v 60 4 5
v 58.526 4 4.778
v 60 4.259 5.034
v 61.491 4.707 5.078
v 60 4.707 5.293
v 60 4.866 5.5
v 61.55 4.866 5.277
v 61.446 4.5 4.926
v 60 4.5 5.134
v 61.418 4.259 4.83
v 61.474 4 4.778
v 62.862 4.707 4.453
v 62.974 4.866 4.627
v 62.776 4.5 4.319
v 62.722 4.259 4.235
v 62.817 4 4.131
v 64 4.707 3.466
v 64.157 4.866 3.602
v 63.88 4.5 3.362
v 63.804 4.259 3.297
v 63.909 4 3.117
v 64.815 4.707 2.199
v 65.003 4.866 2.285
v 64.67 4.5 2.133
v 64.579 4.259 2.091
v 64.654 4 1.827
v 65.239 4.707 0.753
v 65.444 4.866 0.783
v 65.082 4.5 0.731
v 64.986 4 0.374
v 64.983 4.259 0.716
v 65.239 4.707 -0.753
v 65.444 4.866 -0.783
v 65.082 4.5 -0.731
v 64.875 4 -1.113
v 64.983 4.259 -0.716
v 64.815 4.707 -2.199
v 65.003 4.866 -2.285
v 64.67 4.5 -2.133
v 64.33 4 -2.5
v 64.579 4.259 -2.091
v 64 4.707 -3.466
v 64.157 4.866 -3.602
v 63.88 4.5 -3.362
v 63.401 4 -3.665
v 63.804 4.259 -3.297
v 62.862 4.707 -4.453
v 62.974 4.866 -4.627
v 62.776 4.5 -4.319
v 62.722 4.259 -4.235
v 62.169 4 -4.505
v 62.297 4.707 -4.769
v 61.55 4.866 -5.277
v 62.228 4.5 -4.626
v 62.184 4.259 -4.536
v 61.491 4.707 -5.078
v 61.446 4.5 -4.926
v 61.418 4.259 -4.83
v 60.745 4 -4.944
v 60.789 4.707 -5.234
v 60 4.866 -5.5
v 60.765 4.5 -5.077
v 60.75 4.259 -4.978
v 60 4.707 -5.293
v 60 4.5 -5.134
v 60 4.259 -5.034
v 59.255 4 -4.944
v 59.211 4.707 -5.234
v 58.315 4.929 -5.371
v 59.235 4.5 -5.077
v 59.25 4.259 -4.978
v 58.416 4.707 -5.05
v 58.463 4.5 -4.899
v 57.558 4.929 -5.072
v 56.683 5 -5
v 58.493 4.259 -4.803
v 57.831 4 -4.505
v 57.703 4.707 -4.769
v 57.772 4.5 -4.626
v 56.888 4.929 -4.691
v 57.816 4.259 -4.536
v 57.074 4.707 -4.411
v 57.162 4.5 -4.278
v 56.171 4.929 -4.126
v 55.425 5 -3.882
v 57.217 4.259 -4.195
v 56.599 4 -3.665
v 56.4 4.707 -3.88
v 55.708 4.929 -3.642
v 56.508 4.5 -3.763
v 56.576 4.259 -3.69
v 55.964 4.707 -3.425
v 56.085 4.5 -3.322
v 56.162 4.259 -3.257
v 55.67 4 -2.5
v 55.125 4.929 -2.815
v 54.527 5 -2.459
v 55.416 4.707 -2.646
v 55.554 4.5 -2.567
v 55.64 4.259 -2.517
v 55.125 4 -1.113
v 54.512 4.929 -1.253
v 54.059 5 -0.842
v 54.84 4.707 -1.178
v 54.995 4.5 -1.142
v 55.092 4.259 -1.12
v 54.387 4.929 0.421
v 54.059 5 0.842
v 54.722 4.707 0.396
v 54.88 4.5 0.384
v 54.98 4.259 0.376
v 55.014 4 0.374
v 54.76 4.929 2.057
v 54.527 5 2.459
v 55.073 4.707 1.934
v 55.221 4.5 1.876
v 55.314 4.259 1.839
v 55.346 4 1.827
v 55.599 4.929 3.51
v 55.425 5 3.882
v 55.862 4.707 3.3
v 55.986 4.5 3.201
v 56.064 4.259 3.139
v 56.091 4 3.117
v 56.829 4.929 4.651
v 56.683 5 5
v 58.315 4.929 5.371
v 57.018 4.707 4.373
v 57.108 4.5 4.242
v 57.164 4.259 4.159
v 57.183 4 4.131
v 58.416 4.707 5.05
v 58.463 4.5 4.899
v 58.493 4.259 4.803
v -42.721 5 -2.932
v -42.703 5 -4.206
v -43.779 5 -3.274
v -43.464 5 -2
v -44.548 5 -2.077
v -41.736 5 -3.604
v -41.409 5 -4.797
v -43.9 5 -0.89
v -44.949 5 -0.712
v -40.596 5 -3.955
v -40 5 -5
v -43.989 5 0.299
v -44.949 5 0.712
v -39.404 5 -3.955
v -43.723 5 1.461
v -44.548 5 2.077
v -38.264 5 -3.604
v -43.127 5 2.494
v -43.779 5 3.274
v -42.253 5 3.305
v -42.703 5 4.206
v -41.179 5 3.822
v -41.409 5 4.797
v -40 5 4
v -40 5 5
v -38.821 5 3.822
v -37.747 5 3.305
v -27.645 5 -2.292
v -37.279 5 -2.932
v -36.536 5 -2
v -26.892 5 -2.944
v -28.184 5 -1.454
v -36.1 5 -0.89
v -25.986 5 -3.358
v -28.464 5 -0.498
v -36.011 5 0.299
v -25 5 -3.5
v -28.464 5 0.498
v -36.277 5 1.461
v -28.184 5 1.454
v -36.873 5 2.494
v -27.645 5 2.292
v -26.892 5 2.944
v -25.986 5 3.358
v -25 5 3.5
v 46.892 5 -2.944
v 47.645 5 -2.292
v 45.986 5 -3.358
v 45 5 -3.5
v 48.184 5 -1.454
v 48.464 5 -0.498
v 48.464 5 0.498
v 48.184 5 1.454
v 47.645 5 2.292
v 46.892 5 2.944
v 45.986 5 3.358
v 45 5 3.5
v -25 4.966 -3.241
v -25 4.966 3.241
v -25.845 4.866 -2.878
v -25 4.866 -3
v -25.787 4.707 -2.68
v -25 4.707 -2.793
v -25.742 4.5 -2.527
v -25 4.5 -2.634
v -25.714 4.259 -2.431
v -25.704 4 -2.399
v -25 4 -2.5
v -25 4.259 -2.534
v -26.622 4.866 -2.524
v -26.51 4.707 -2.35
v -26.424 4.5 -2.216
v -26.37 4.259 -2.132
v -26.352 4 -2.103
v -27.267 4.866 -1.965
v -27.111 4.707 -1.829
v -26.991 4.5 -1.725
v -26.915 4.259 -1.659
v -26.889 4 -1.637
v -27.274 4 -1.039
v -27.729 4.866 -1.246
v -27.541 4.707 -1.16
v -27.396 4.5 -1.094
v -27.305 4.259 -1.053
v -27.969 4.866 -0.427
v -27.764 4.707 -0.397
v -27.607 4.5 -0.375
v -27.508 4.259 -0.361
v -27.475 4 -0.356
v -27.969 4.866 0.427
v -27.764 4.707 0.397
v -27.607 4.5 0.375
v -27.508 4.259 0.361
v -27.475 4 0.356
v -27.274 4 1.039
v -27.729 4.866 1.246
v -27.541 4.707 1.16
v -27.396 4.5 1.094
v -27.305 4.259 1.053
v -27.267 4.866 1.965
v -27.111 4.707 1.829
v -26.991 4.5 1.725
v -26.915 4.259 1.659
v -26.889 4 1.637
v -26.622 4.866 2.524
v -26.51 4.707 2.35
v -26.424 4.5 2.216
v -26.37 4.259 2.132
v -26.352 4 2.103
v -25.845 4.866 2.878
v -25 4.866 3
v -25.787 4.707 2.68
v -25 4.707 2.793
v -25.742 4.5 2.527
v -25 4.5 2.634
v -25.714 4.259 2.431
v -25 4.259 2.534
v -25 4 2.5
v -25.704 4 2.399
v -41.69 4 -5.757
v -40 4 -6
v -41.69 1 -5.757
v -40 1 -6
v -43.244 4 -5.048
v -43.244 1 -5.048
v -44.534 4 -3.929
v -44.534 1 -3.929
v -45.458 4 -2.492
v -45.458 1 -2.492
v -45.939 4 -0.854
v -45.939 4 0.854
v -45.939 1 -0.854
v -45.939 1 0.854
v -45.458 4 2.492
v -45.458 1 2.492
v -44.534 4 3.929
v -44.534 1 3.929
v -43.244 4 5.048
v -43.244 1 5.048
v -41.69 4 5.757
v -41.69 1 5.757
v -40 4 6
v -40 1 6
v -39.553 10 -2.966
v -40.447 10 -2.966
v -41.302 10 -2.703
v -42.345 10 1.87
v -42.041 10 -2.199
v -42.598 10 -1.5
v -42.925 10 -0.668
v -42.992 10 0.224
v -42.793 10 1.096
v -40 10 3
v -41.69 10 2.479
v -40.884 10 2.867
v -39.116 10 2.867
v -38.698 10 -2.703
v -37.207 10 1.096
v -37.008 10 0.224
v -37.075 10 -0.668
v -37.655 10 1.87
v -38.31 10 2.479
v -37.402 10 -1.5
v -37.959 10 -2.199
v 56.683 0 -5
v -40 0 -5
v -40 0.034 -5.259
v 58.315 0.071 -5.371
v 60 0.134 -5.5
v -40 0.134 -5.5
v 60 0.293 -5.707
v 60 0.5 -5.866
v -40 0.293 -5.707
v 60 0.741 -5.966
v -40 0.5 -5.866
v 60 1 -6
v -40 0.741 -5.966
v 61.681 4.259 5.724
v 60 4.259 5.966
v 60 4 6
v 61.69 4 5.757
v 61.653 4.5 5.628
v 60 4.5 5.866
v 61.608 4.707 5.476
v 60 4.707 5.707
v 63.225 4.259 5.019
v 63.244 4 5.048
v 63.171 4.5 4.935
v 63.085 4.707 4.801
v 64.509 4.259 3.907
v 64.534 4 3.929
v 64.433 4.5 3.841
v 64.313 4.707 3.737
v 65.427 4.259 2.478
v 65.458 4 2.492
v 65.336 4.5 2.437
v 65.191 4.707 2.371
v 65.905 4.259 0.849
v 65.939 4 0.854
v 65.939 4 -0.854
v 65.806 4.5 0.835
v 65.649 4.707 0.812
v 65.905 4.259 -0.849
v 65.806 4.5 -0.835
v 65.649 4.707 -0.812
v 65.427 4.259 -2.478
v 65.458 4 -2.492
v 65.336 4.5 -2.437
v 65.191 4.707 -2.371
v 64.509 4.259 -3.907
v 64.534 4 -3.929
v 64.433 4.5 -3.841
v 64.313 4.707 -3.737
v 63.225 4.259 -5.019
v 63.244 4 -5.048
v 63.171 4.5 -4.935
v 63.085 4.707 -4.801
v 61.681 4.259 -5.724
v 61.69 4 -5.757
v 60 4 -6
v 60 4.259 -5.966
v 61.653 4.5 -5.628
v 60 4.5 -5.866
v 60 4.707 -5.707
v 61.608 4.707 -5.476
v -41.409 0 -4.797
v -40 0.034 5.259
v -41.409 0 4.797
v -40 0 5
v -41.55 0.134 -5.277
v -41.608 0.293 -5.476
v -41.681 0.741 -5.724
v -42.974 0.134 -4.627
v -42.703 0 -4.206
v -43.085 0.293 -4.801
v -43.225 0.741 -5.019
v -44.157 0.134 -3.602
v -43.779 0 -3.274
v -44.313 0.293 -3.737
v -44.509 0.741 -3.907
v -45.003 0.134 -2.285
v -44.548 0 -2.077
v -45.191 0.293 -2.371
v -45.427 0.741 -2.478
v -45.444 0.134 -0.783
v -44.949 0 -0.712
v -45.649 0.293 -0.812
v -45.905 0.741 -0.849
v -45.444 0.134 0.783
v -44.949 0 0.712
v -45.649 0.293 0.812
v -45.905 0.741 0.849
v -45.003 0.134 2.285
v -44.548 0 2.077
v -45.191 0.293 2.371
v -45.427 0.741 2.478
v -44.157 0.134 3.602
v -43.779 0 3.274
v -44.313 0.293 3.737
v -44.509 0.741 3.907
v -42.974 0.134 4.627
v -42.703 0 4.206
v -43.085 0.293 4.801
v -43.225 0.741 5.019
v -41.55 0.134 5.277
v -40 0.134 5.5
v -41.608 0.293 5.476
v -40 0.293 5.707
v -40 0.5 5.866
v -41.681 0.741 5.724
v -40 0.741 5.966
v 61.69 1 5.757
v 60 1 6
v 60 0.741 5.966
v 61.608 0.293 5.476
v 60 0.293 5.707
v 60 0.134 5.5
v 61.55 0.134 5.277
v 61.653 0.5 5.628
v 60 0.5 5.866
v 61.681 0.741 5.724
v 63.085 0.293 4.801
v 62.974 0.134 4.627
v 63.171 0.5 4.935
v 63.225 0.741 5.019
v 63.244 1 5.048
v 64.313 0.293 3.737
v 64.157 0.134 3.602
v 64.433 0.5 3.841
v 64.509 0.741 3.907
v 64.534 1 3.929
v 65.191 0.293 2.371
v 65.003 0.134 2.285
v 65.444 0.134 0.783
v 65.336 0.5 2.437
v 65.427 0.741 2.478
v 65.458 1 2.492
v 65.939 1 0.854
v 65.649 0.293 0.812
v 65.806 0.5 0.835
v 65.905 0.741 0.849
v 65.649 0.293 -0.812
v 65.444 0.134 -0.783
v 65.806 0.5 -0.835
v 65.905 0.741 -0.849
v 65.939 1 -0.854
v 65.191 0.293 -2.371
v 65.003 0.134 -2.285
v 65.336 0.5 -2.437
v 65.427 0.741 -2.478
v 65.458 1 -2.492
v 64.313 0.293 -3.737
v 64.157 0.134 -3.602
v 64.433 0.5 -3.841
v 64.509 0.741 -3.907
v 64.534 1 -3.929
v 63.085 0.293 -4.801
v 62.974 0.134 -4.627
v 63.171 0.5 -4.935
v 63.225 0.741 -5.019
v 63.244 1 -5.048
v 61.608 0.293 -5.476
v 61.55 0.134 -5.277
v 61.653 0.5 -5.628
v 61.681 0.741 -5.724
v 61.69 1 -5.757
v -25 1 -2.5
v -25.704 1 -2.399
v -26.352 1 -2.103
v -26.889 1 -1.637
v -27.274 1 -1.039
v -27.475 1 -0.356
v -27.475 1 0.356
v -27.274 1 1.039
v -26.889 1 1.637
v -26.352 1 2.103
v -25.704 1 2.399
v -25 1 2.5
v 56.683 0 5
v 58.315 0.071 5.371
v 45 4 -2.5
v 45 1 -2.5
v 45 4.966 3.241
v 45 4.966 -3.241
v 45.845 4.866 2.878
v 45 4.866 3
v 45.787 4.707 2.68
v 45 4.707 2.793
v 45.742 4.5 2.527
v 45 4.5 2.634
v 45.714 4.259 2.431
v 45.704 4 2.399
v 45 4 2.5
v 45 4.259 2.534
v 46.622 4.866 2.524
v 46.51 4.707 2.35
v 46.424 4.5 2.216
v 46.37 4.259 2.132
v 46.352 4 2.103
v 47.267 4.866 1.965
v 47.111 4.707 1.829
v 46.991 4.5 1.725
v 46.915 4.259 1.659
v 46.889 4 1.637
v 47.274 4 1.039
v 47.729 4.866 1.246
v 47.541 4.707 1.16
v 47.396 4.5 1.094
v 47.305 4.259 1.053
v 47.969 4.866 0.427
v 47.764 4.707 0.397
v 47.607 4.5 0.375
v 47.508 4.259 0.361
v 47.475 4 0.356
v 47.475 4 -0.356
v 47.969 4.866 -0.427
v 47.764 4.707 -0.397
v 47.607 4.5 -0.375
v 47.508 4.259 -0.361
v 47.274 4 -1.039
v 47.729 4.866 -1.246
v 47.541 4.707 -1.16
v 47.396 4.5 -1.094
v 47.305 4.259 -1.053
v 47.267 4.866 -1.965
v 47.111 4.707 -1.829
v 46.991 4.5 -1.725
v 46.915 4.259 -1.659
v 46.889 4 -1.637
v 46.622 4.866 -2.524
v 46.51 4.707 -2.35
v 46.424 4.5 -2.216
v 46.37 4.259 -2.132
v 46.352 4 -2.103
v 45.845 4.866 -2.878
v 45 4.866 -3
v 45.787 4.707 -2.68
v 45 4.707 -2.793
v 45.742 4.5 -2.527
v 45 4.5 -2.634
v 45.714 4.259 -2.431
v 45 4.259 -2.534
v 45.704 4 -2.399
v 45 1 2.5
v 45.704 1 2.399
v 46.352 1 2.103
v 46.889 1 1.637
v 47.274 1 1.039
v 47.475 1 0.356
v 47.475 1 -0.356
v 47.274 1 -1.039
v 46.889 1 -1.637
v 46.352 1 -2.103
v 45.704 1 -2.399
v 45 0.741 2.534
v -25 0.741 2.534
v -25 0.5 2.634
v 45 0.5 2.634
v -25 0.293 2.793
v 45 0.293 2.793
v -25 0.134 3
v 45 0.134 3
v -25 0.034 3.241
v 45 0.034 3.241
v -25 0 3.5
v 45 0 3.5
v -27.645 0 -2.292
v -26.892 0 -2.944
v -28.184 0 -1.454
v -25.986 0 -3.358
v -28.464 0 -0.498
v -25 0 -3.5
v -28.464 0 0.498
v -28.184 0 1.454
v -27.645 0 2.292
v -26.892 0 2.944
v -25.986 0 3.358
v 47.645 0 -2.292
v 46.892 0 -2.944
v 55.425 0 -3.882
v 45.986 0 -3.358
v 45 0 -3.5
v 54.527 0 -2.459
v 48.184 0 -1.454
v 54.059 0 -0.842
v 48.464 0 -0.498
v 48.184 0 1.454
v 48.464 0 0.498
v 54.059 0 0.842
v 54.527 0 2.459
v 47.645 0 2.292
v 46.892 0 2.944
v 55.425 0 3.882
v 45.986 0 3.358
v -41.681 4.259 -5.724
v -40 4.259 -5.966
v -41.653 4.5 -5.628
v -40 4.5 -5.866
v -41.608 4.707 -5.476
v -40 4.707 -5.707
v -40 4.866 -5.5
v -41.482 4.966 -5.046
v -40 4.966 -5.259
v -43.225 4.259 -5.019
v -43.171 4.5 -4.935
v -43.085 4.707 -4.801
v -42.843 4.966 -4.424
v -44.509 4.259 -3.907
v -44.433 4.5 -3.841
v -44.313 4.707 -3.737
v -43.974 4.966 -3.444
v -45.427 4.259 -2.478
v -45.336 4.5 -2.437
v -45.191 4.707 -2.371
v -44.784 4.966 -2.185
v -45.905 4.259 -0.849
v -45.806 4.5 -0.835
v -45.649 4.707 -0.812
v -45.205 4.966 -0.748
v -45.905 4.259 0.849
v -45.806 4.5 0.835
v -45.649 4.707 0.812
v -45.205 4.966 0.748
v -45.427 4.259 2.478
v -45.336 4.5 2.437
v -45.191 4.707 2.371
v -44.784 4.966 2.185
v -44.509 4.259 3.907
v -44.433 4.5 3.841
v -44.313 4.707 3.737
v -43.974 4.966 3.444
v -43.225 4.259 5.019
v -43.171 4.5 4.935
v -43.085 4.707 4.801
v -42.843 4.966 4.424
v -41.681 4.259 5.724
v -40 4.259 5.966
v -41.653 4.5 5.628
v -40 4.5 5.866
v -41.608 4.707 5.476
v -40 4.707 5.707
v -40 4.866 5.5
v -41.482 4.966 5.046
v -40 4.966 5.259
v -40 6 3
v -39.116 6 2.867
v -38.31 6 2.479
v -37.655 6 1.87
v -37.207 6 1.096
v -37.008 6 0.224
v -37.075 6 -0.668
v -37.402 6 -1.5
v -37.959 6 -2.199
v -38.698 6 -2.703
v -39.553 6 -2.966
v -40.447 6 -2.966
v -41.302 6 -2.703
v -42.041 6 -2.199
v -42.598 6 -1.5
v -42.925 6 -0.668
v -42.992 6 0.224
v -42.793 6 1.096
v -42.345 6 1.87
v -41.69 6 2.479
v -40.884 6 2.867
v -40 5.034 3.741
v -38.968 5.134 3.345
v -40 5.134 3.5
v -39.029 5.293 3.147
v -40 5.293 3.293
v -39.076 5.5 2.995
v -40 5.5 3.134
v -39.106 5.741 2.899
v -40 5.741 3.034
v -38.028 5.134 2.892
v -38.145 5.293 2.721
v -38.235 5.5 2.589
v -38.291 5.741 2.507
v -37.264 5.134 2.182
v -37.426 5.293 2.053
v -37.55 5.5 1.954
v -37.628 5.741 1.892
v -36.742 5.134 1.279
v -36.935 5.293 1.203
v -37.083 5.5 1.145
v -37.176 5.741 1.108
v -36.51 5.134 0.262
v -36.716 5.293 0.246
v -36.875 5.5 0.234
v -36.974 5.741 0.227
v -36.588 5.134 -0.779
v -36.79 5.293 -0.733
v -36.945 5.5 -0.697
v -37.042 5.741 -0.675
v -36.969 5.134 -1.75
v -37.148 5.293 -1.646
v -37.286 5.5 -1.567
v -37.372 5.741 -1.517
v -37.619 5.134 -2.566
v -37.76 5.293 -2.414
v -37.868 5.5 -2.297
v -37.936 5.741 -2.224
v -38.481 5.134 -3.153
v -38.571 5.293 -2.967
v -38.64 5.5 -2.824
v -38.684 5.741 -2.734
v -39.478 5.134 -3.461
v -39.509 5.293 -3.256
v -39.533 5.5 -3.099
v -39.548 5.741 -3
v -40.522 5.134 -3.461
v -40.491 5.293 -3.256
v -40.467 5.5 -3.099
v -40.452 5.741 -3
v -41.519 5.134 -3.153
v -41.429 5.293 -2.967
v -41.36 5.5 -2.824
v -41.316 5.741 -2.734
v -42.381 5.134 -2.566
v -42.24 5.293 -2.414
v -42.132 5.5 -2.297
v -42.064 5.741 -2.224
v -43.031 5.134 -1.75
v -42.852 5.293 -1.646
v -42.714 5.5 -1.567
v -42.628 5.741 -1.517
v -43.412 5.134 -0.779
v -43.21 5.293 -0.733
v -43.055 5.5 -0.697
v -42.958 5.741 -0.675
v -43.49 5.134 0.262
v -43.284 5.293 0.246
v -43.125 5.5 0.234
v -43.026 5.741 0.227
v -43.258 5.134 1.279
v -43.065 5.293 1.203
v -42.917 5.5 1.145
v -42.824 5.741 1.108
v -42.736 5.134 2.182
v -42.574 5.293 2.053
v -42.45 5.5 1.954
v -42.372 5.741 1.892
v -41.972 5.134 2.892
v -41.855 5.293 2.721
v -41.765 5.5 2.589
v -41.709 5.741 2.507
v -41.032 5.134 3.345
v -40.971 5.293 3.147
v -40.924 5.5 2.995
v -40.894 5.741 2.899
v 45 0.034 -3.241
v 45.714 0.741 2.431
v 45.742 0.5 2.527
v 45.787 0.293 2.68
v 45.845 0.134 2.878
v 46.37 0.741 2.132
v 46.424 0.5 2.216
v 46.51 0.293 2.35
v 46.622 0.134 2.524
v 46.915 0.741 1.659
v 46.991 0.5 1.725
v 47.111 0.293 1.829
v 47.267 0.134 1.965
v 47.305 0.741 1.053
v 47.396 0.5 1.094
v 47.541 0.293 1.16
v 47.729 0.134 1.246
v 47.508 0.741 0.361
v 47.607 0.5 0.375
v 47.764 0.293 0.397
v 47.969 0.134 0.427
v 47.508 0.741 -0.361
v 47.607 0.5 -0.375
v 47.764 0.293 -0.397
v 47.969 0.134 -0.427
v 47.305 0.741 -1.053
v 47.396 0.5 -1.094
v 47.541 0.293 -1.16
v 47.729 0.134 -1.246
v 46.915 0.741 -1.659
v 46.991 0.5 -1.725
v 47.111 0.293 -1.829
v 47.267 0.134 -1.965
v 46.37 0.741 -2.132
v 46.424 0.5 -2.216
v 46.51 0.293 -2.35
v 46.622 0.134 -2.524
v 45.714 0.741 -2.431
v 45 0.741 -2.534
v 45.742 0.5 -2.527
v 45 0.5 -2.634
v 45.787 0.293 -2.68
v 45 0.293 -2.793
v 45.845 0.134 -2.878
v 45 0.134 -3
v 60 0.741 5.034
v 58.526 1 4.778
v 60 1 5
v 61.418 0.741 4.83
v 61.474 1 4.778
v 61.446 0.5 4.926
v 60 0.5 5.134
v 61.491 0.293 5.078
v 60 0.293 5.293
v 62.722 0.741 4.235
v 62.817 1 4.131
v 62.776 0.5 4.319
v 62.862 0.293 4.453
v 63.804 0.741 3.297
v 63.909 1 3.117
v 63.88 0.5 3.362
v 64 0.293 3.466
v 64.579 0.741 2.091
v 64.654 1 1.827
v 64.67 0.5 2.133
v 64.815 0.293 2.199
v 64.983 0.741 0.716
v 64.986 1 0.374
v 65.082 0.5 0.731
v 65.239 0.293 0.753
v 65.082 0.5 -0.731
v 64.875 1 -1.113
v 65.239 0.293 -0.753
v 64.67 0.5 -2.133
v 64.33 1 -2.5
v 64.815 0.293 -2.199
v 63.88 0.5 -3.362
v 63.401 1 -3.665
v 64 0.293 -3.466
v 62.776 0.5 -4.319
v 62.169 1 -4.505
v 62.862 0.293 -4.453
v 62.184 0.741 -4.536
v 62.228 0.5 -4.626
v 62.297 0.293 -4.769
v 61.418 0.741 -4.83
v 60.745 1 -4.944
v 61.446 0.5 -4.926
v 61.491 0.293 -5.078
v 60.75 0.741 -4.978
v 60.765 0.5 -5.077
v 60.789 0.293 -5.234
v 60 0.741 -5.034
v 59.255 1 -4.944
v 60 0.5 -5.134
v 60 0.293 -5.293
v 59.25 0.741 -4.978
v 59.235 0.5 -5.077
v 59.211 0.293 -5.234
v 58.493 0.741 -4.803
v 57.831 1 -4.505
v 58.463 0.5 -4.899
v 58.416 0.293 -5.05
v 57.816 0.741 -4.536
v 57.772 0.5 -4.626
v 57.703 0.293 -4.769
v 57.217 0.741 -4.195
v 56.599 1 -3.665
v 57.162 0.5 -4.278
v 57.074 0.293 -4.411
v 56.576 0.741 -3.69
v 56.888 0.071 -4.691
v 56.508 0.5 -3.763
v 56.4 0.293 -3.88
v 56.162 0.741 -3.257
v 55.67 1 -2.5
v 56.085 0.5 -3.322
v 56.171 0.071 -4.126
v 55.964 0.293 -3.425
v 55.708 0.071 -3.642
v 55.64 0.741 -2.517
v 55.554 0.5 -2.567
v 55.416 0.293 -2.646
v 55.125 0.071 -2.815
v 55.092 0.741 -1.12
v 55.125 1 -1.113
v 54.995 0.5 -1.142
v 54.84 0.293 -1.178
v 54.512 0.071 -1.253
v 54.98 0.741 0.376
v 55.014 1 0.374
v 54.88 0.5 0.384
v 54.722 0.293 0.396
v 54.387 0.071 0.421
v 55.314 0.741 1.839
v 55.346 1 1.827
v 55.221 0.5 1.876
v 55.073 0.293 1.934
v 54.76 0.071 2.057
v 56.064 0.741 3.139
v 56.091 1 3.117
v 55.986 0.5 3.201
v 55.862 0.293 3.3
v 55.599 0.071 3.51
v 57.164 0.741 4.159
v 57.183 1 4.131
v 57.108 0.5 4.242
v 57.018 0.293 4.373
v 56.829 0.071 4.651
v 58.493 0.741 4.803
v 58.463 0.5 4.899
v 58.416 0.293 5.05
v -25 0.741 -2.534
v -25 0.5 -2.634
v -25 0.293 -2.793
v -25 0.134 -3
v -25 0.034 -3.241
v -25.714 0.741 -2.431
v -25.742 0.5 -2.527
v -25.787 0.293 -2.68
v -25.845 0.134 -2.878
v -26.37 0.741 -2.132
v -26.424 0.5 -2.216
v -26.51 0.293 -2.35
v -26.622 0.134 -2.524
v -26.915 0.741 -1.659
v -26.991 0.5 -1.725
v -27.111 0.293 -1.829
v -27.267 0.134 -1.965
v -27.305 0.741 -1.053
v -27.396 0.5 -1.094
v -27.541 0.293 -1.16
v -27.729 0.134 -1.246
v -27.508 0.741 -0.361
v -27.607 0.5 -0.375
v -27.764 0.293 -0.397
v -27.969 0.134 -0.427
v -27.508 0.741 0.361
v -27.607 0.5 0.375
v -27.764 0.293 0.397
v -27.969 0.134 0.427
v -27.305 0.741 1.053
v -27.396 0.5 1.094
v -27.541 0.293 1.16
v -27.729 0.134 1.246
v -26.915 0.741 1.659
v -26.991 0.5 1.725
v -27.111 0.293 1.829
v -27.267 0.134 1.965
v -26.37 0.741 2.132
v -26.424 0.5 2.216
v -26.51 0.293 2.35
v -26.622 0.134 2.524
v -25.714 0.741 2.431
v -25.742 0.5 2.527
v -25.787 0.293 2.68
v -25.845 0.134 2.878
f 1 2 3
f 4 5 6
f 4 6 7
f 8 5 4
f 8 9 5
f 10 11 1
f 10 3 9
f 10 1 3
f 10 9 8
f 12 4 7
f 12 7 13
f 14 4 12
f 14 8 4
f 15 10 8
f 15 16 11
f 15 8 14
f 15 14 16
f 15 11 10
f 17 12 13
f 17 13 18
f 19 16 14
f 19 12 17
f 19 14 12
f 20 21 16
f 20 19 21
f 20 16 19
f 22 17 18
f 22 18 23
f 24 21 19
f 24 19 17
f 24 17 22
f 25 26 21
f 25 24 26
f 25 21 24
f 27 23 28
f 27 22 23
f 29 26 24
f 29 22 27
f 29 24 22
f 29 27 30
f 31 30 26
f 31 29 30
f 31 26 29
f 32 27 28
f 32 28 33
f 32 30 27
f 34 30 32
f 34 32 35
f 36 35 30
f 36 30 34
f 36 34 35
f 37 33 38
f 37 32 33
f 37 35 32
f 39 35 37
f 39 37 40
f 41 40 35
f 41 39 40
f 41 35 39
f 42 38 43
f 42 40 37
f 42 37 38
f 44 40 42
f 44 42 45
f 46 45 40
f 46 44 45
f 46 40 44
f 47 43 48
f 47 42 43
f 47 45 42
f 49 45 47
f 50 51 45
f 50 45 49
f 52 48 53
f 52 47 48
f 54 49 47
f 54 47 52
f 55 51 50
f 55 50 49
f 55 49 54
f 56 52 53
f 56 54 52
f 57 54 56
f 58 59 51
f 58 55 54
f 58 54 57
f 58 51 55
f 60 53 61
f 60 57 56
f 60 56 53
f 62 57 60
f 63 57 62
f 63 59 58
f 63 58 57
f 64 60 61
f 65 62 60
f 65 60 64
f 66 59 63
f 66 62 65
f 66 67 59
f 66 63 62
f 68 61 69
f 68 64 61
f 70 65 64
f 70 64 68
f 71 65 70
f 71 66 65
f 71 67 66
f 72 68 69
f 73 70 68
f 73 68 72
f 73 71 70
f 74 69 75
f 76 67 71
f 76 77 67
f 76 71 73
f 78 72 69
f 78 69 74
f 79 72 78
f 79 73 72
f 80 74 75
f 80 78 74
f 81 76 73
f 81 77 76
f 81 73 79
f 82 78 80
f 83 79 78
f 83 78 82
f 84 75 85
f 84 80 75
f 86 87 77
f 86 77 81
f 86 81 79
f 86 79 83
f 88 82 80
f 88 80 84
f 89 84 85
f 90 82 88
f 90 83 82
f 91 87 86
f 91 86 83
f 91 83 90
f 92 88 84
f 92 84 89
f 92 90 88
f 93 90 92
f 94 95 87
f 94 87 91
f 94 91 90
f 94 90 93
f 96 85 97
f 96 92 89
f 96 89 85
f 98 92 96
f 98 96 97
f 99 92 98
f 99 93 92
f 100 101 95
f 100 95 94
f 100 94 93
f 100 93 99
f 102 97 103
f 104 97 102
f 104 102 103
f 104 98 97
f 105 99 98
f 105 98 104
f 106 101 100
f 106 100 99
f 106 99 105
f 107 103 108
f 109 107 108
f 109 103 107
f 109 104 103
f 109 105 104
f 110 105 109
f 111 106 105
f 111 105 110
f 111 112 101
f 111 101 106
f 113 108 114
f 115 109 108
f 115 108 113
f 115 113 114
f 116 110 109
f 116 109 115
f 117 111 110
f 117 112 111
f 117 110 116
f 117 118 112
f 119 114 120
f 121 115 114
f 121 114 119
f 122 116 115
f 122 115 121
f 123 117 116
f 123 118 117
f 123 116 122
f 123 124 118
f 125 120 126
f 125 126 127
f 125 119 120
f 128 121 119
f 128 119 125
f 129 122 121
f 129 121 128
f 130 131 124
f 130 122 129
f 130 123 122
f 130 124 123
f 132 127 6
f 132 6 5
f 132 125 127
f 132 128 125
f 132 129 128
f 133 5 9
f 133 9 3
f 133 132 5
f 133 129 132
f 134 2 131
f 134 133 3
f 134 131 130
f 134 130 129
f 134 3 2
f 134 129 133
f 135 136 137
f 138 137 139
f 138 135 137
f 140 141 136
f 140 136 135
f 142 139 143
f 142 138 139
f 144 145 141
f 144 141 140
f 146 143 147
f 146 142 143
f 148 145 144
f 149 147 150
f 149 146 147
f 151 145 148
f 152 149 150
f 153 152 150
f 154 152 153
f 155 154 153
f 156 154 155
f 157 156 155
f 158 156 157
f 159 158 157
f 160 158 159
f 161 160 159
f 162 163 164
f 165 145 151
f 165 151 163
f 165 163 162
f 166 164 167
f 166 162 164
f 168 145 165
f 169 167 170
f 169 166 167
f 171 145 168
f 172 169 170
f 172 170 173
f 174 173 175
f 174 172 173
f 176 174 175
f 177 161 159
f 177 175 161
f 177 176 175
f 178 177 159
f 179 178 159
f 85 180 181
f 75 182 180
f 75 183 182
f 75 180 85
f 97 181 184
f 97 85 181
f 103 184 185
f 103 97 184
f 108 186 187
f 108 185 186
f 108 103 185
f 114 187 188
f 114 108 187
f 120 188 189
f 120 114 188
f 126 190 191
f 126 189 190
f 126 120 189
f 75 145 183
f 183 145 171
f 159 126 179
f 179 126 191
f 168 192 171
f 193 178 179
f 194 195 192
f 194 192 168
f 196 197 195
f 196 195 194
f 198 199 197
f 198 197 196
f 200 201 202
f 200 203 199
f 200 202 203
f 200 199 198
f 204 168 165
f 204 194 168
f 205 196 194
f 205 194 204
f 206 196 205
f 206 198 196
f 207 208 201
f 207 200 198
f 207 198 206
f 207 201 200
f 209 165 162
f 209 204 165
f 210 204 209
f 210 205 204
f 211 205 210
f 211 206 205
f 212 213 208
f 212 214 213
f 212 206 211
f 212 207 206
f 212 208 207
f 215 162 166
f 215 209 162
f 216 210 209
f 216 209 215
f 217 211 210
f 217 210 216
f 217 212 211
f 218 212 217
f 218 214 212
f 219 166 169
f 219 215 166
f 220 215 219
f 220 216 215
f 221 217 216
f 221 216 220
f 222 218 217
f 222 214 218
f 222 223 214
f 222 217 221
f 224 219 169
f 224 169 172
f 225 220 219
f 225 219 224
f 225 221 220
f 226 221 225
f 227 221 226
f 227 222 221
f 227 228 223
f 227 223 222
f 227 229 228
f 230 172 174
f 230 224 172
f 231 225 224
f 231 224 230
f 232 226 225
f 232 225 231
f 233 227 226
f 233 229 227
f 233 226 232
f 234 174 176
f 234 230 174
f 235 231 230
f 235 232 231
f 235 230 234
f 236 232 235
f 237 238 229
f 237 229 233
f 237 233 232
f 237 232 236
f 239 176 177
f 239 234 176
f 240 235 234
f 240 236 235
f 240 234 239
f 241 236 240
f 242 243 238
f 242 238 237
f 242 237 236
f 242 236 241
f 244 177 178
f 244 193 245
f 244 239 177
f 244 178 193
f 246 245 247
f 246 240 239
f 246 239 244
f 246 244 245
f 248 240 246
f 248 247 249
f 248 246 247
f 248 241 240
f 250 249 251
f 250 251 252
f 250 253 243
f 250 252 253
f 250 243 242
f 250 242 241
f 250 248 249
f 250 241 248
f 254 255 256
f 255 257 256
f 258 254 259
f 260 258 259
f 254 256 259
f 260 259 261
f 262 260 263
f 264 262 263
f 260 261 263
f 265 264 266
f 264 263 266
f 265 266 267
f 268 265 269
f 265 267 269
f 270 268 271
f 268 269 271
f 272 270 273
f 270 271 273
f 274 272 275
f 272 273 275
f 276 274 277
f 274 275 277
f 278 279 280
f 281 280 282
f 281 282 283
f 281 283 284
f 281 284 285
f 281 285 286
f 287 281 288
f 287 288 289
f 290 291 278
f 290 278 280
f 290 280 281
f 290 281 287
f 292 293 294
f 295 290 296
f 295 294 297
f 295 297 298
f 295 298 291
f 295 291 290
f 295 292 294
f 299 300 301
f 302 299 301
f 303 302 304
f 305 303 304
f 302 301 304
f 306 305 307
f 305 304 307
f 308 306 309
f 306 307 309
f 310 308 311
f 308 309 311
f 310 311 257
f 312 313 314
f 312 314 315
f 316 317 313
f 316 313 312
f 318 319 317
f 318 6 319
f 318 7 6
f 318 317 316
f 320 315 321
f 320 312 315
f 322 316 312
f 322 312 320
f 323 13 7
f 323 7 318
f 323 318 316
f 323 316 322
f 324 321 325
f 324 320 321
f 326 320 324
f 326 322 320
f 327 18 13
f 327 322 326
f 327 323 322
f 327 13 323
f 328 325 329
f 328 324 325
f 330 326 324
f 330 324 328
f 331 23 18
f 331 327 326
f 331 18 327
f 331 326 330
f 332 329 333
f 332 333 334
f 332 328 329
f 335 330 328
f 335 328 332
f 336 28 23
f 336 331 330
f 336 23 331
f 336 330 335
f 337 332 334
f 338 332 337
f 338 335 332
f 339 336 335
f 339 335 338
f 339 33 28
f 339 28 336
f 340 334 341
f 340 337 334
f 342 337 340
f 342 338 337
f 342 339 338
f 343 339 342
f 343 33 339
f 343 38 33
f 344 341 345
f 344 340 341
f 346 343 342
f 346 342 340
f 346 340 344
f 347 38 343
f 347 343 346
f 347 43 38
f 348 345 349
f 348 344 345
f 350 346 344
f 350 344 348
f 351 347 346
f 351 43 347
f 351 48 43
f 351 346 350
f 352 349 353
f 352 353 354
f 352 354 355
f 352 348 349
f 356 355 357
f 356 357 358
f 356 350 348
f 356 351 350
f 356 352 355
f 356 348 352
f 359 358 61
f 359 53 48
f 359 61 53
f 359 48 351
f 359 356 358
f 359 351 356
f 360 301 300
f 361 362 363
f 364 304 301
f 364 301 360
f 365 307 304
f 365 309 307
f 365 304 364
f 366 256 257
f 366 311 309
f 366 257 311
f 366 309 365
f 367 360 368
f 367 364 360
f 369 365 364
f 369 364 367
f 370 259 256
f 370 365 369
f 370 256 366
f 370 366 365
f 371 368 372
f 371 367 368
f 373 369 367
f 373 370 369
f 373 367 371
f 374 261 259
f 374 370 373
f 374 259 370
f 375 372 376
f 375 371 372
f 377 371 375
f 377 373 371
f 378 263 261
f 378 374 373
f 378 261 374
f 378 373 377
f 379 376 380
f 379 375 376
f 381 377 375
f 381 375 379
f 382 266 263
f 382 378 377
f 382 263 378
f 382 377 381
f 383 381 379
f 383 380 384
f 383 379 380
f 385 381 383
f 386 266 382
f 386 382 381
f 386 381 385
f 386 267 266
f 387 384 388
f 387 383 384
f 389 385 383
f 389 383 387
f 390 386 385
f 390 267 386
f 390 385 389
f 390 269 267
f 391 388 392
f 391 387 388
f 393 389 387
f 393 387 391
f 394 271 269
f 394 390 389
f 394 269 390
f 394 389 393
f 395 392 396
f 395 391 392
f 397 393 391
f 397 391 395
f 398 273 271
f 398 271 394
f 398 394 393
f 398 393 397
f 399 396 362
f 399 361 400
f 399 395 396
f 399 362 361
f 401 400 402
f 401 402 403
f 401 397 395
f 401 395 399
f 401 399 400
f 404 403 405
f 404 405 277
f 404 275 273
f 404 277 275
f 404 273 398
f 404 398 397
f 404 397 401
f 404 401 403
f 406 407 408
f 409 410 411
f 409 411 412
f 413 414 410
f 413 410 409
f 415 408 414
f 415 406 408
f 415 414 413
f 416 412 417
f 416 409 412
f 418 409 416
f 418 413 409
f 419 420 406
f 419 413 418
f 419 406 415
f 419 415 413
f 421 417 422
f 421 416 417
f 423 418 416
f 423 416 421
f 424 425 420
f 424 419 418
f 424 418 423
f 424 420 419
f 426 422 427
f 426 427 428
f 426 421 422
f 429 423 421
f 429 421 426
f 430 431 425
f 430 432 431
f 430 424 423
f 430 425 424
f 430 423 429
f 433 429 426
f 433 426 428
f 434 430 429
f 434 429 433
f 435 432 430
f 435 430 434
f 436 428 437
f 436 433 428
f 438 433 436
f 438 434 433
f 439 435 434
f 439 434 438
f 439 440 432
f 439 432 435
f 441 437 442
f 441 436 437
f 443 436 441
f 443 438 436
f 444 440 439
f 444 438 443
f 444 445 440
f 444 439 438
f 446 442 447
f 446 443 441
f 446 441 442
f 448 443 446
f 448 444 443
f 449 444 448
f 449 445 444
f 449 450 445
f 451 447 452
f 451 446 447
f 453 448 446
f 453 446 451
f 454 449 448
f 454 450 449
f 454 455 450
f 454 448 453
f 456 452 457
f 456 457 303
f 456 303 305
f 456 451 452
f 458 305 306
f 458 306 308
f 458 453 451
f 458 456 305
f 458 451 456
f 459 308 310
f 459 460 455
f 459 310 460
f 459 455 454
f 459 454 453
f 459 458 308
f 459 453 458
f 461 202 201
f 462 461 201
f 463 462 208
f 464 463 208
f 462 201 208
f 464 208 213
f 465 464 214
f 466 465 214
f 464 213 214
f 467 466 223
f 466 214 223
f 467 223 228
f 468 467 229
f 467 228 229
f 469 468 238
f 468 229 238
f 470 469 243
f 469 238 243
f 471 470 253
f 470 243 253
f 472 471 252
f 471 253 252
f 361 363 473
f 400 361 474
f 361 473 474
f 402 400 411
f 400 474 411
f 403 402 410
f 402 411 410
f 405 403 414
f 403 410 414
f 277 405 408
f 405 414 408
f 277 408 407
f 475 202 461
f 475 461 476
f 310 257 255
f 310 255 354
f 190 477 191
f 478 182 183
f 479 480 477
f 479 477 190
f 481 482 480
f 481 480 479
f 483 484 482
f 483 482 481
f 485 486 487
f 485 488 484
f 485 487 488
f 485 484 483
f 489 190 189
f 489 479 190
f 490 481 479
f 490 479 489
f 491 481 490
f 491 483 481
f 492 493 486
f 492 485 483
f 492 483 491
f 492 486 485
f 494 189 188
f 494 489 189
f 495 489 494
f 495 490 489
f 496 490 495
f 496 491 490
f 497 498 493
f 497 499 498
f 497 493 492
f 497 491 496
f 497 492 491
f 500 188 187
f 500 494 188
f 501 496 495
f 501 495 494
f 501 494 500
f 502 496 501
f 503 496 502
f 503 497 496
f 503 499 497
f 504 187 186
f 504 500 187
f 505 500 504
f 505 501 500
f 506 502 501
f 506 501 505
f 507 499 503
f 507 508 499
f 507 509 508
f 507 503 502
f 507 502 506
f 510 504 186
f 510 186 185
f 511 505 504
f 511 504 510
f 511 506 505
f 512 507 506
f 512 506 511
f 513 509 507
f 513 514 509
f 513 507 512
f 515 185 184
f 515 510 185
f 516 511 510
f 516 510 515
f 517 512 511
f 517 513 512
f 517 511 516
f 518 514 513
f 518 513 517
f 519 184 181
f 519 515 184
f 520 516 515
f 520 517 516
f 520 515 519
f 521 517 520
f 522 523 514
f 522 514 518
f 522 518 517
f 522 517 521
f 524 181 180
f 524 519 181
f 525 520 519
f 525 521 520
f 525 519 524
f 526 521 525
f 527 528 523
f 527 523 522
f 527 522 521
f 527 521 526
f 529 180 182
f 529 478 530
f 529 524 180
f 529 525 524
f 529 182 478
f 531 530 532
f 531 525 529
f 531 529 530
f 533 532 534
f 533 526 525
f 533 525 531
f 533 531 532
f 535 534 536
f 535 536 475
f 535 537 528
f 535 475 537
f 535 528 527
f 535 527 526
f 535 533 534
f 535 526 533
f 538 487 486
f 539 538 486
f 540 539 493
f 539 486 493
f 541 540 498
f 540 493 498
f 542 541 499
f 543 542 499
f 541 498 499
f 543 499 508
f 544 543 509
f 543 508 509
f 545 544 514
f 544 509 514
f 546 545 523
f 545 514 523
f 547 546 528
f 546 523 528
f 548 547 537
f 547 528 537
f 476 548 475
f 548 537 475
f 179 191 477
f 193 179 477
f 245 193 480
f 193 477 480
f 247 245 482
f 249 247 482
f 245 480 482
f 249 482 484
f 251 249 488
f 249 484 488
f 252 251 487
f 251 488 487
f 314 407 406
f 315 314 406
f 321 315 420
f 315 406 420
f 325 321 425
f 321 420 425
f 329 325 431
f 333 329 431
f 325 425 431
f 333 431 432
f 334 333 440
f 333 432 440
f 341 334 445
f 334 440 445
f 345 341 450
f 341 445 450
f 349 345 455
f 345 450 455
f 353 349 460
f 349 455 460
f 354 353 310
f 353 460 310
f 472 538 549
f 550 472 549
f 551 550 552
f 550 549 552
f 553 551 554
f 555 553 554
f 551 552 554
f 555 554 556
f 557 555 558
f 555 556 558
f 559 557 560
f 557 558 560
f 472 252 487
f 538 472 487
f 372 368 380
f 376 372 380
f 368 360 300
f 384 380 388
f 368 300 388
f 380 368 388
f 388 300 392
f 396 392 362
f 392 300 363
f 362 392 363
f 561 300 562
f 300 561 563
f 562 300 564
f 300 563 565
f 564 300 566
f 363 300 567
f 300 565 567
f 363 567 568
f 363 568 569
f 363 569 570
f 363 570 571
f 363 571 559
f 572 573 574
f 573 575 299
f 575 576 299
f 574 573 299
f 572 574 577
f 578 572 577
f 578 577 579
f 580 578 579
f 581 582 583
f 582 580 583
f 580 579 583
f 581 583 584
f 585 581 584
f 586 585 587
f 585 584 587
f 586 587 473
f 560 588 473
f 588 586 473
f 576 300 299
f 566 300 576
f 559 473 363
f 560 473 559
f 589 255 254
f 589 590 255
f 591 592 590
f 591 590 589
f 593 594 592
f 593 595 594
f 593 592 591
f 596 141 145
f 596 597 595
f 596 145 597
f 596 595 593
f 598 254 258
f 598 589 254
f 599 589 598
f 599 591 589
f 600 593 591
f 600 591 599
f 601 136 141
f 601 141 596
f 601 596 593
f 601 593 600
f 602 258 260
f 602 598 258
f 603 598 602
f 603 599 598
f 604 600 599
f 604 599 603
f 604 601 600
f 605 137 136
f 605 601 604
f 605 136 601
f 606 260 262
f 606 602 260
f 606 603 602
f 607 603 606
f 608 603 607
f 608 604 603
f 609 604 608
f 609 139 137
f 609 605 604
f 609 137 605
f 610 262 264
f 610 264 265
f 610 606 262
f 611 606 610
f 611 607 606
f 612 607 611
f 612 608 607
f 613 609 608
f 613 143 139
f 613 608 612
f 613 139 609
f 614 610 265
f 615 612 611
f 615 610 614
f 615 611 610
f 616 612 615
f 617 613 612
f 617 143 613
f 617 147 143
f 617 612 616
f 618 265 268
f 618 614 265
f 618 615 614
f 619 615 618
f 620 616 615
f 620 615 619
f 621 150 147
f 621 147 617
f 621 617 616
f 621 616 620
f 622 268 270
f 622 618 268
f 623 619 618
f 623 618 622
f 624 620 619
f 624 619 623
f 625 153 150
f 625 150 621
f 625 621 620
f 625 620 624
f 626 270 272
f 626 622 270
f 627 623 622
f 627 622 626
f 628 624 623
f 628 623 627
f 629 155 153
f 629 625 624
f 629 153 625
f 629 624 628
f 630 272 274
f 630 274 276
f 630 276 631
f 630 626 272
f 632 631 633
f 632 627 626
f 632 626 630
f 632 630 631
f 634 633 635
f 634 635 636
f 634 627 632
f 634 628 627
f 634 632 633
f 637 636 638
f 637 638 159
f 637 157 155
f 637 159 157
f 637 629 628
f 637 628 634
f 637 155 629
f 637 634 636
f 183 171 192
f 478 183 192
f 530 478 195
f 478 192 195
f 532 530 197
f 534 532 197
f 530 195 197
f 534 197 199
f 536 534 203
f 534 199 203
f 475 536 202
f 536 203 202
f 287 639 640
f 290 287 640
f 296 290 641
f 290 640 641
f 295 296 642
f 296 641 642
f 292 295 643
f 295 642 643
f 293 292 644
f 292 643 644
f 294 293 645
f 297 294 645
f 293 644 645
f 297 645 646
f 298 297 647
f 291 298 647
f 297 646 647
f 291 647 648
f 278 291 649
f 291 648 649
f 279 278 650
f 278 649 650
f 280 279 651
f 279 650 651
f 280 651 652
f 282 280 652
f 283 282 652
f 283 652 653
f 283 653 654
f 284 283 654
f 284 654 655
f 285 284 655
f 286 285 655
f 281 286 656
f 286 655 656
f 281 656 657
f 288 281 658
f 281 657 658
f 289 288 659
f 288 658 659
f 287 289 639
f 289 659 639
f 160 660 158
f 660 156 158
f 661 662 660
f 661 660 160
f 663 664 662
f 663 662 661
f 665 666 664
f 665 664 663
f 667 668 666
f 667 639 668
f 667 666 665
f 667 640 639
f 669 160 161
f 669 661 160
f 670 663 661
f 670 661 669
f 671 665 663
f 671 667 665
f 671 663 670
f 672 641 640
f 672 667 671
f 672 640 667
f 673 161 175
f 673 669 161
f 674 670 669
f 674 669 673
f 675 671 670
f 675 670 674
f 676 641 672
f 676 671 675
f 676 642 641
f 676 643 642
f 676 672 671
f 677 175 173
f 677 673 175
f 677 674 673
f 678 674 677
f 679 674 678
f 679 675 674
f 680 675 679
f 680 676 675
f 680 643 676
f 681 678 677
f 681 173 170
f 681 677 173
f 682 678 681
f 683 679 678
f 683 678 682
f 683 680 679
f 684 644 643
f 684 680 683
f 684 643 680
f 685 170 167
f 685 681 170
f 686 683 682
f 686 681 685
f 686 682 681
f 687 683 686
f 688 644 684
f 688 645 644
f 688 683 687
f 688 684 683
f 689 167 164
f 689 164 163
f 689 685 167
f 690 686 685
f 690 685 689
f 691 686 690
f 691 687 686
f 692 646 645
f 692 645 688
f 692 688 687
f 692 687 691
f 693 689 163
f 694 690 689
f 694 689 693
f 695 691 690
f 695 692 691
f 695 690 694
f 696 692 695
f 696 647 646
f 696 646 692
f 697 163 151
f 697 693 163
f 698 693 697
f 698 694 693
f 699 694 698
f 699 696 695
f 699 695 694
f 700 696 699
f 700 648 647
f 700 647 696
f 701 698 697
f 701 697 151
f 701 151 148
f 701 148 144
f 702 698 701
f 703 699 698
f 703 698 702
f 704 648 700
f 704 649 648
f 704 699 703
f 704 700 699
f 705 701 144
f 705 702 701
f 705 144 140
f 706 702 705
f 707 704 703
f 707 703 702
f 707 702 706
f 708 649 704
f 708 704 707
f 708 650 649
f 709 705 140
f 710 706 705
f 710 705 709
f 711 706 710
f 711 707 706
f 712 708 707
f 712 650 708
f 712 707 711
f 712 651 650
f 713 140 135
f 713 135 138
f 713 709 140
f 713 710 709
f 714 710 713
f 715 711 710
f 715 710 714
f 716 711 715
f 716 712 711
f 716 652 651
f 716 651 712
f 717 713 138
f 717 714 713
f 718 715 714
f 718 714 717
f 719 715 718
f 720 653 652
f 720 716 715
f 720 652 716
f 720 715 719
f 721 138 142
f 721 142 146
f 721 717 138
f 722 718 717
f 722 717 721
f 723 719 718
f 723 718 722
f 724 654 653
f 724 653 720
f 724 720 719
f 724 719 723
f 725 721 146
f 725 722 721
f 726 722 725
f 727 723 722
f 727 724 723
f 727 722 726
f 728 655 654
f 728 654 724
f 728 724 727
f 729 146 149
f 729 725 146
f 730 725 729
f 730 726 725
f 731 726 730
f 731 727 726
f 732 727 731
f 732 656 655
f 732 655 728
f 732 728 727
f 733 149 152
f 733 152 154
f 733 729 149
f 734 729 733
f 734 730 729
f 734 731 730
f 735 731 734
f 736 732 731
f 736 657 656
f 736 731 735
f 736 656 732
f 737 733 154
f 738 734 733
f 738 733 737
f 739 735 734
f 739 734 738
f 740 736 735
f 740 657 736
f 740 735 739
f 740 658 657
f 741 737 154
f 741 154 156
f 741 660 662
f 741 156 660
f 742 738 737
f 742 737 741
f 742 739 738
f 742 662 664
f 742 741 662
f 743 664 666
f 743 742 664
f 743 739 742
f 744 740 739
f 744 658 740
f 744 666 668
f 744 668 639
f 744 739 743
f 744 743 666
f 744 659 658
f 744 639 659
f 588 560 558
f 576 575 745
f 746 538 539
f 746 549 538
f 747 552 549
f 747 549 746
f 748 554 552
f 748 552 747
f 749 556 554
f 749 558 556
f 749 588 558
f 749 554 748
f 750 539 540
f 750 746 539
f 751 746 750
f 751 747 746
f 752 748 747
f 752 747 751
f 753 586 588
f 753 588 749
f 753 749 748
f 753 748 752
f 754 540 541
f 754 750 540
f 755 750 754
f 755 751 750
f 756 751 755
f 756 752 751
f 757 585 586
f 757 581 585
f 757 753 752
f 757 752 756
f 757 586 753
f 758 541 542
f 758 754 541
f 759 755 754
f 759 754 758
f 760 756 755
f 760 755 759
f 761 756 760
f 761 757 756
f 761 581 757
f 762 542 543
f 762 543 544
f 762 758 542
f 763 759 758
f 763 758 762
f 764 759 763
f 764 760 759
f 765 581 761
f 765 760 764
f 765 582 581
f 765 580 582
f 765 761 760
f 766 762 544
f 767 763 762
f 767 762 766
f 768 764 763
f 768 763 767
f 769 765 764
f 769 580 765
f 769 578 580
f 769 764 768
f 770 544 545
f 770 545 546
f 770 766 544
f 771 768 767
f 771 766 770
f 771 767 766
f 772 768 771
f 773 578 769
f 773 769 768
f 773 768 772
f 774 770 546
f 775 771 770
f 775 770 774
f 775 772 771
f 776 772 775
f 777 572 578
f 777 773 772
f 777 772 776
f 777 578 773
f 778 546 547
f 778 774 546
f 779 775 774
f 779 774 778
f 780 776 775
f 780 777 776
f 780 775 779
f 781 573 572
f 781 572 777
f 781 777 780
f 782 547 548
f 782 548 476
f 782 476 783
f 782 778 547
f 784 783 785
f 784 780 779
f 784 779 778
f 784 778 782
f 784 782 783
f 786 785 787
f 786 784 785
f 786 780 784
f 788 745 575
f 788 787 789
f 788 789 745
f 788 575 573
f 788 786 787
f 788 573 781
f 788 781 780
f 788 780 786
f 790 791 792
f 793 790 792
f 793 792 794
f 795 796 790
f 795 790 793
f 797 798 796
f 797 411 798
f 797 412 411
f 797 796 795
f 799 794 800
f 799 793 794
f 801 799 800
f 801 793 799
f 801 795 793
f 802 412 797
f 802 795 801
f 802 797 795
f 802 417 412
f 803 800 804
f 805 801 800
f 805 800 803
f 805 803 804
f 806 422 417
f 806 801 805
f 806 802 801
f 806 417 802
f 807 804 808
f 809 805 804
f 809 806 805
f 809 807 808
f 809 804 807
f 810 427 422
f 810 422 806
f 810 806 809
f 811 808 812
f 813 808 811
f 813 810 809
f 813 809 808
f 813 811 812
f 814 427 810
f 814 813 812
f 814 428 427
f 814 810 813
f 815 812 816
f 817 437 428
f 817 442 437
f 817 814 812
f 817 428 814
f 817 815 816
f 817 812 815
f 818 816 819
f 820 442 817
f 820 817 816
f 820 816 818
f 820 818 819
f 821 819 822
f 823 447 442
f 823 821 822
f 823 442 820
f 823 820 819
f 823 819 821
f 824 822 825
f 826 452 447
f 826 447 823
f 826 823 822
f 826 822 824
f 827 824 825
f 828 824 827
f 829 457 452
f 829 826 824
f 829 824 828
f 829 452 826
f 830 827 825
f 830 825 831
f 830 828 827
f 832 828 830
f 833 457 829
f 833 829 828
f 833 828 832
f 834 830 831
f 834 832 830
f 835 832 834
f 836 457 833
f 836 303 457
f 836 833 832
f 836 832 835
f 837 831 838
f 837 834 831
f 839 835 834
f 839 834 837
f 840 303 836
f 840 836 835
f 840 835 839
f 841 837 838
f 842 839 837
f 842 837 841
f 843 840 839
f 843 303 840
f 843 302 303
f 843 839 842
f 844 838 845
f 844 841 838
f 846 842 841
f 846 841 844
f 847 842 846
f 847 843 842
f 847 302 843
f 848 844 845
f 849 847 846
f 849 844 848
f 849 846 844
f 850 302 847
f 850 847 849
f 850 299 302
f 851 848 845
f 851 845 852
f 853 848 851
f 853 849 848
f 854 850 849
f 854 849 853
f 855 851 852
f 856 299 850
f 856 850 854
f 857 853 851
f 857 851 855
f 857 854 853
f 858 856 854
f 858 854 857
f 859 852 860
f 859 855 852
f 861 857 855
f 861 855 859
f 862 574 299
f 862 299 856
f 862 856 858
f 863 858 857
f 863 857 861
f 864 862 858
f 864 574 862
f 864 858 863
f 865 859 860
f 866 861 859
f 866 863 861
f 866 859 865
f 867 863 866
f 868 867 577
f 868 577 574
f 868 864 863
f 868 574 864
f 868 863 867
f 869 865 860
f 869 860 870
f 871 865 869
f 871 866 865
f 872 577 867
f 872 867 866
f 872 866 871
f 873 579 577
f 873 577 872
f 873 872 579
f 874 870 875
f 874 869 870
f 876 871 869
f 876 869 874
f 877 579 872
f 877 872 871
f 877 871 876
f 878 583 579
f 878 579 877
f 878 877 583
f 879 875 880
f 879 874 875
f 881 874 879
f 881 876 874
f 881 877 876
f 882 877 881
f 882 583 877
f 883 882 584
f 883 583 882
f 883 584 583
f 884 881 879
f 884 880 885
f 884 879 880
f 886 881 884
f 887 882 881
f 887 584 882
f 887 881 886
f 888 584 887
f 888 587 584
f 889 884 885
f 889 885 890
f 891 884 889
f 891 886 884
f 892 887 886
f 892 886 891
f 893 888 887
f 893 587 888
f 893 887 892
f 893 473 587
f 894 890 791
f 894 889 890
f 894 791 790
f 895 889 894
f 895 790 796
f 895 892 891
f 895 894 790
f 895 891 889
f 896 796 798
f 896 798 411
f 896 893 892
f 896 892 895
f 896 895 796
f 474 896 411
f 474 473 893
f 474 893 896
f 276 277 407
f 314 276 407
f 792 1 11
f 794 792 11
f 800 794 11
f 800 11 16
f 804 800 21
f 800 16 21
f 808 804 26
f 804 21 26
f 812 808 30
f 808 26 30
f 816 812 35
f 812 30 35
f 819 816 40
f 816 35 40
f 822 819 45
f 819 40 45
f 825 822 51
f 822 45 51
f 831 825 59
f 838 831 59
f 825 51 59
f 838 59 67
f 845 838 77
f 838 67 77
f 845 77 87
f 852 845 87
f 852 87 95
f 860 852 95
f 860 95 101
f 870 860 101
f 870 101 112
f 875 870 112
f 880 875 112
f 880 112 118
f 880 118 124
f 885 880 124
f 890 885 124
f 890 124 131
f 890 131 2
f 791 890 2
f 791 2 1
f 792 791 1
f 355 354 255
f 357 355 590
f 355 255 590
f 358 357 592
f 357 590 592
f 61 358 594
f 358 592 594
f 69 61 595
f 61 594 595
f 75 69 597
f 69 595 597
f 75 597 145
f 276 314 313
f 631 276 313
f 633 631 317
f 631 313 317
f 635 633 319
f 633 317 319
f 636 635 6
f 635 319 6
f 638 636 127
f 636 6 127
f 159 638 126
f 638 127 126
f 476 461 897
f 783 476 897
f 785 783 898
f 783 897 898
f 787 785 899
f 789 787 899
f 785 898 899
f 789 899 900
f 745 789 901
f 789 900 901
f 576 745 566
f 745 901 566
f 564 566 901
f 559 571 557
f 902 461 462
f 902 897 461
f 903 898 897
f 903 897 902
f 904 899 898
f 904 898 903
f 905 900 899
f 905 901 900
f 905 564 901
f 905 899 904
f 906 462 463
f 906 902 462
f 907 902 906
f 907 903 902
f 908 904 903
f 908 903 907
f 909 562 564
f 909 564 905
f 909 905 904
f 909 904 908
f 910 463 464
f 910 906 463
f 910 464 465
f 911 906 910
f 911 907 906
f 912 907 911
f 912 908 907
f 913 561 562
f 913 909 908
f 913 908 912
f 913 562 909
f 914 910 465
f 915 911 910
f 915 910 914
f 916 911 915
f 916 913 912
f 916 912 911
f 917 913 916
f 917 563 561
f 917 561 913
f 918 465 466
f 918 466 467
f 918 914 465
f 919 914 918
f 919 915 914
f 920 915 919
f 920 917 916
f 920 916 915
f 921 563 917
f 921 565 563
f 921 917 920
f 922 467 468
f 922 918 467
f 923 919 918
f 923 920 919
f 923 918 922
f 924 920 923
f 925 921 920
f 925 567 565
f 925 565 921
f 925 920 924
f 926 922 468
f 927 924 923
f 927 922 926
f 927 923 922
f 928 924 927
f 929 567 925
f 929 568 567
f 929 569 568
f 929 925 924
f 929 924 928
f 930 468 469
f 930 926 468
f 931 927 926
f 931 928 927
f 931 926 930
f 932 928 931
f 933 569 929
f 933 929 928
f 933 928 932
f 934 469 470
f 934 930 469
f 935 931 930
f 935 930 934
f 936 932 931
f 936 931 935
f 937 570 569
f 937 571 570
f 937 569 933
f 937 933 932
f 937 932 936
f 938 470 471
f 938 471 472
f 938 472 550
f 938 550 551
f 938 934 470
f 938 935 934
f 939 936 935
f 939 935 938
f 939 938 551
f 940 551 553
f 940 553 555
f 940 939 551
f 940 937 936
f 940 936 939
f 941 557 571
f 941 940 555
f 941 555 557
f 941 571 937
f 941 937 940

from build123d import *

# Parameters (mm, degrees)
SKETCH_1_R          = 6
EXTRUDE_1_DEPTH     = 5
EXTRUDE_1_2_DEPTH   = 5
SKETCH_3_W          = 100
SKETCH_3_H          = 12
EXTRUDE_3_DEPTH     = 5
SKETCH_5_R          = 5
CUT_EXTRUDE_2_DEPTH = 67.460514593
SKETCH_6_R          = 2.5
CUT_EXTRUDE_3_DEPTH = 67.460514593
SKETCH_7_W          = 70
SKETCH_7_H          = 5
CUT_EXTRUDE_4_DEPTH = 67.460514593
SKETCH_4_R          = 3
EXTRUDE_4_DEPTH     = 5
FILLET_1_R          = 1
FILLET_2_R          = 1


with BuildPart() as part:
    # 草图1 → 凸台-拉伸1 (new body)
    with BuildSketch(Plane(origin=(0, 0, 0), x_dir=(1, 0, 0), z_dir=(0, 1, 0))):
        with Locations(Location((-40, 0, 0), (0, 0, 270))):
            Circle(SKETCH_1_R)
    extrude(amount=EXTRUDE_1_DEPTH)



with BuildPart() as body_2:
    # 草图1 → Extrude 1 2 (new body)
    with BuildSketch(Plane(origin=(0, 0, 0), x_dir=(1, 0, 0), z_dir=(0, 1, 0))):
        with Locations(Location((60, 0, 0), (0, 0, 270))):
            Circle(SKETCH_1_R)
    extrude(amount=EXTRUDE_1_2_DEPTH)


with BuildPart() as part_1:
    add(part.part)

    add(body_2.part)  # 凸台-拉伸3 merges body 2
    # 草图3 → 凸台-拉伸3 (add)
    with BuildSketch(Plane(origin=(0, 0, 0), x_dir=(1, 0, 0), z_dir=(0, 1, 0))):
        with Locations((10, 0)):
            Rectangle(SKETCH_3_W, SKETCH_3_H)
    extrude(amount=EXTRUDE_3_DEPTH)

    # 草图5 → 切除-拉伸2 (cut, through all)
    with BuildSketch(Plane(origin=(0, 5, 0), x_dir=(1, 0, 0), z_dir=(0, 1, 0))):
        with Locations(Location((60, 0, 0), (0, 0, 270))):
            Circle(SKETCH_5_R)
    extrude(amount=-CUT_EXTRUDE_2_DEPTH, mode=Mode.SUBTRACT)

    # 草图6 → 切除-拉伸3 (cut, through all)
    with BuildSketch(Plane(origin=(0, 5, 0), x_dir=(1, 0, 0), z_dir=(0, 1, 0))):
        with Locations(Location((-25, 0, 0), (0, 0, 270))):
            Circle(SKETCH_6_R)
        with Locations(Location((45, 0, 0), (0, 0, 270))):
            Circle(SKETCH_6_R)
    extrude(amount=-CUT_EXTRUDE_3_DEPTH, mode=Mode.SUBTRACT)

    # 草图7 → 切除-拉伸4 (cut, through all)
    with BuildSketch(Plane(origin=(0, 5, 0), x_dir=(1, 0, 0), z_dir=(0, 1, 0))):
        with Locations((10, 0)):
            Rectangle(SKETCH_7_W, SKETCH_7_H)
    extrude(amount=-CUT_EXTRUDE_4_DEPTH, mode=Mode.SUBTRACT)

    # 草图4 → 凸台-拉伸4 (add)
    with BuildSketch(Plane(origin=(0, 5, 0), x_dir=(1, 0, 0), z_dir=(0, 1, 0))):
        with Locations(Location((-40, 0, 0), (0, 0, 270))):
            Circle(SKETCH_4_R)
    extrude(amount=EXTRUDE_4_DEPTH)

    # 圆角1
    fillet_1_edges = [part_1.edges().sort_by_distance(p)[0] for p in [
        (-40, 5, -3),
    ]]
    fillet(fillet_1_edges, radius=FILLET_1_R)

    # 圆角2
    # the kernel refuses this fillet: 1 mm, written as the material it takes off along each edge
    with BuildSketch(Plane(origin=(-40, 5, 0), x_dir=(0, 0, -1), z_dir=(1, 0, 0))) as fillet_2_piece_1:
        with BuildLine():
            CenterArc((6 - FILLET_2_R, -FILLET_2_R), FILLET_2_R, 0, 90)
            Line((6, -FILLET_2_R), (6, 0))
            Line((6, 0), (6 - FILLET_2_R, 0))
        make_face()
    revolve(axis=Axis((-40, 5, 0), (0, 1, 0)), revolution_arc=180, mode=Mode.SUBTRACT)
    with BuildSketch(Plane(origin=(-40, 0, -6), x_dir=(0, 1, 0), z_dir=(1, 0, 0)), Plane(origin=(-40, 5, -6), x_dir=(0, 0, 1), z_dir=(1, 0, 0)), Plane(origin=(60, 0, 6), x_dir=(0, 1, 0), z_dir=(-1, 0, 0)), Plane(origin=(60, 5, 6), x_dir=(0, 0, -1), z_dir=(-1, 0, 0))) as fillet_2_piece_2:
        with BuildLine():
            CenterArc((FILLET_2_R, FILLET_2_R), FILLET_2_R, 180, 90)
            Line((0, FILLET_2_R), (0, 0))
            Line((0, 0), (FILLET_2_R, 0))
        make_face()
    extrude(amount=100, mode=Mode.SUBTRACT)
    with BuildSketch(Plane(origin=(60, 5, 0), x_dir=(0, 0, 1), z_dir=(-1, 0, 0))) as fillet_2_piece_3:
        with BuildLine():
            CenterArc((6 - FILLET_2_R, -FILLET_2_R), FILLET_2_R, 0, 90)
            Line((6, -FILLET_2_R), (6, 0))
            Line((6, 0), (6 - FILLET_2_R, 0))
        make_face()
    revolve(axis=Axis((60, 5, 0), (0, 1, 0)), revolution_arc=180, mode=Mode.SUBTRACT)
    with BuildSketch(Plane(origin=(60, 5, 0), x_dir=(0, 0, 1), z_dir=(-1, 0, 0))) as fillet_2_piece_4:
        with BuildLine():
            CenterArc((5 + FILLET_2_R, -FILLET_2_R), FILLET_2_R, 90, 90)
            Line((5, -FILLET_2_R), (5, 0))
            Line((5, 0), (5 + FILLET_2_R, 0))
        make_face()
    revolve(axis=Axis((60, 5, 0), (0, 1, 0)), mode=Mode.SUBTRACT)
    with BuildSketch(Plane(origin=(-25, 5, 0), x_dir=(0, 0, -1), z_dir=(1, 0, 0))) as fillet_2_piece_5:
        with BuildLine():
            CenterArc((2.5 + FILLET_2_R, -FILLET_2_R), FILLET_2_R, 90, 90)
            Line((2.5, -FILLET_2_R), (2.5, 0))
            Line((2.5, 0), (2.5 + FILLET_2_R, 0))
        make_face()
    revolve(axis=Axis((-25, 5, 0), (0, 1, 0)), revolution_arc=180, mode=Mode.SUBTRACT)
    with BuildSketch(Plane(origin=(45, 5, 2.5), x_dir=(0, 0, 1), z_dir=(-1, 0, 0)), Plane(origin=(-25, 5, -2.5), x_dir=(0, 0, -1), z_dir=(1, 0, 0)), Plane(origin=(45, 0, 2.5), x_dir=(0, 1, 0), z_dir=(-1, 0, 0)), Plane(origin=(-25, 0, -2.5), x_dir=(0, 1, 0), z_dir=(1, 0, 0))) as fillet_2_piece_6:
        with BuildLine():
            CenterArc((FILLET_2_R, -FILLET_2_R), FILLET_2_R, 90, 90)
            Line((0, -FILLET_2_R), (0, 0))
            Line((0, 0), (FILLET_2_R, 0))
        make_face()
    extrude(amount=70, mode=Mode.SUBTRACT)
    with BuildSketch(Plane(origin=(45, 5, 0), x_dir=(0, 0, 1), z_dir=(-1, 0, 0))) as fillet_2_piece_7:
        with BuildLine():
            CenterArc((2.5 + FILLET_2_R, -FILLET_2_R), FILLET_2_R, 90, 90)
            Line((2.5, -FILLET_2_R), (2.5, 0))
            Line((2.5, 0), (2.5 + FILLET_2_R, 0))
        make_face()
    revolve(axis=Axis((45, 5, 0), (0, 1, 0)), revolution_arc=180, mode=Mode.SUBTRACT)
    with BuildSketch(Plane(origin=(-40, 0, 0), x_dir=(0, 0, -1), z_dir=(1, 0, 0))) as fillet_2_piece_8:
        with BuildLine():
            CenterArc((6 - FILLET_2_R, FILLET_2_R), FILLET_2_R, 270, 90)
            Line((6 - FILLET_2_R, 0), (6, 0))
            Line((6, 0), (6, FILLET_2_R))
        make_face()
    revolve(axis=Axis((-40, 0, 0), (0, 1, 0)), revolution_arc=180, mode=Mode.SUBTRACT)
    with BuildSketch(Plane(origin=(60, 0, 0), x_dir=(0, 0, 1), z_dir=(-1, 0, 0))) as fillet_2_piece_9:
        with BuildLine():
            CenterArc((6 - FILLET_2_R, FILLET_2_R), FILLET_2_R, 270, 90)
            Line((6 - FILLET_2_R, 0), (6, 0))
            Line((6, 0), (6, FILLET_2_R))
        make_face()
    revolve(axis=Axis((60, 0, 0), (0, 1, 0)), revolution_arc=180, mode=Mode.SUBTRACT)
    with BuildSketch(Plane(origin=(60, 0, 0), x_dir=(0, 0, 1), z_dir=(-1, 0, 0))) as fillet_2_piece_10:
        with BuildLine():
            CenterArc((5 + FILLET_2_R, FILLET_2_R), FILLET_2_R, 180, 90)
            Line((5 + FILLET_2_R, 0), (5, 0))
            Line((5, 0), (5, FILLET_2_R))
        make_face()
    revolve(axis=Axis((60, 0, 0), (0, 1, 0)), mode=Mode.SUBTRACT)
    with BuildSketch(Plane(origin=(-25, 0, 0), x_dir=(0, 0, -1), z_dir=(1, 0, 0))) as fillet_2_piece_11:
        with BuildLine():
            CenterArc((2.5 + FILLET_2_R, FILLET_2_R), FILLET_2_R, 180, 90)
            Line((2.5 + FILLET_2_R, 0), (2.5, 0))
            Line((2.5, 0), (2.5, FILLET_2_R))
        make_face()
    revolve(axis=Axis((-25, 0, 0), (0, 1, 0)), revolution_arc=180, mode=Mode.SUBTRACT)
    with BuildSketch(Plane(origin=(45, 0, 0), x_dir=(0, 0, 1), z_dir=(-1, 0, 0))) as fillet_2_piece_12:
        with BuildLine():
            CenterArc((2.5 + FILLET_2_R, FILLET_2_R), FILLET_2_R, 180, 90)
            Line((2.5 + FILLET_2_R, 0), (2.5, 0))
            Line((2.5, 0), (2.5, FILLET_2_R))
        make_face()
    revolve(axis=Axis((45, 0, 0), (0, 1, 0)), revolution_arc=180, mode=Mode.SUBTRACT)


solid = part_1.part
